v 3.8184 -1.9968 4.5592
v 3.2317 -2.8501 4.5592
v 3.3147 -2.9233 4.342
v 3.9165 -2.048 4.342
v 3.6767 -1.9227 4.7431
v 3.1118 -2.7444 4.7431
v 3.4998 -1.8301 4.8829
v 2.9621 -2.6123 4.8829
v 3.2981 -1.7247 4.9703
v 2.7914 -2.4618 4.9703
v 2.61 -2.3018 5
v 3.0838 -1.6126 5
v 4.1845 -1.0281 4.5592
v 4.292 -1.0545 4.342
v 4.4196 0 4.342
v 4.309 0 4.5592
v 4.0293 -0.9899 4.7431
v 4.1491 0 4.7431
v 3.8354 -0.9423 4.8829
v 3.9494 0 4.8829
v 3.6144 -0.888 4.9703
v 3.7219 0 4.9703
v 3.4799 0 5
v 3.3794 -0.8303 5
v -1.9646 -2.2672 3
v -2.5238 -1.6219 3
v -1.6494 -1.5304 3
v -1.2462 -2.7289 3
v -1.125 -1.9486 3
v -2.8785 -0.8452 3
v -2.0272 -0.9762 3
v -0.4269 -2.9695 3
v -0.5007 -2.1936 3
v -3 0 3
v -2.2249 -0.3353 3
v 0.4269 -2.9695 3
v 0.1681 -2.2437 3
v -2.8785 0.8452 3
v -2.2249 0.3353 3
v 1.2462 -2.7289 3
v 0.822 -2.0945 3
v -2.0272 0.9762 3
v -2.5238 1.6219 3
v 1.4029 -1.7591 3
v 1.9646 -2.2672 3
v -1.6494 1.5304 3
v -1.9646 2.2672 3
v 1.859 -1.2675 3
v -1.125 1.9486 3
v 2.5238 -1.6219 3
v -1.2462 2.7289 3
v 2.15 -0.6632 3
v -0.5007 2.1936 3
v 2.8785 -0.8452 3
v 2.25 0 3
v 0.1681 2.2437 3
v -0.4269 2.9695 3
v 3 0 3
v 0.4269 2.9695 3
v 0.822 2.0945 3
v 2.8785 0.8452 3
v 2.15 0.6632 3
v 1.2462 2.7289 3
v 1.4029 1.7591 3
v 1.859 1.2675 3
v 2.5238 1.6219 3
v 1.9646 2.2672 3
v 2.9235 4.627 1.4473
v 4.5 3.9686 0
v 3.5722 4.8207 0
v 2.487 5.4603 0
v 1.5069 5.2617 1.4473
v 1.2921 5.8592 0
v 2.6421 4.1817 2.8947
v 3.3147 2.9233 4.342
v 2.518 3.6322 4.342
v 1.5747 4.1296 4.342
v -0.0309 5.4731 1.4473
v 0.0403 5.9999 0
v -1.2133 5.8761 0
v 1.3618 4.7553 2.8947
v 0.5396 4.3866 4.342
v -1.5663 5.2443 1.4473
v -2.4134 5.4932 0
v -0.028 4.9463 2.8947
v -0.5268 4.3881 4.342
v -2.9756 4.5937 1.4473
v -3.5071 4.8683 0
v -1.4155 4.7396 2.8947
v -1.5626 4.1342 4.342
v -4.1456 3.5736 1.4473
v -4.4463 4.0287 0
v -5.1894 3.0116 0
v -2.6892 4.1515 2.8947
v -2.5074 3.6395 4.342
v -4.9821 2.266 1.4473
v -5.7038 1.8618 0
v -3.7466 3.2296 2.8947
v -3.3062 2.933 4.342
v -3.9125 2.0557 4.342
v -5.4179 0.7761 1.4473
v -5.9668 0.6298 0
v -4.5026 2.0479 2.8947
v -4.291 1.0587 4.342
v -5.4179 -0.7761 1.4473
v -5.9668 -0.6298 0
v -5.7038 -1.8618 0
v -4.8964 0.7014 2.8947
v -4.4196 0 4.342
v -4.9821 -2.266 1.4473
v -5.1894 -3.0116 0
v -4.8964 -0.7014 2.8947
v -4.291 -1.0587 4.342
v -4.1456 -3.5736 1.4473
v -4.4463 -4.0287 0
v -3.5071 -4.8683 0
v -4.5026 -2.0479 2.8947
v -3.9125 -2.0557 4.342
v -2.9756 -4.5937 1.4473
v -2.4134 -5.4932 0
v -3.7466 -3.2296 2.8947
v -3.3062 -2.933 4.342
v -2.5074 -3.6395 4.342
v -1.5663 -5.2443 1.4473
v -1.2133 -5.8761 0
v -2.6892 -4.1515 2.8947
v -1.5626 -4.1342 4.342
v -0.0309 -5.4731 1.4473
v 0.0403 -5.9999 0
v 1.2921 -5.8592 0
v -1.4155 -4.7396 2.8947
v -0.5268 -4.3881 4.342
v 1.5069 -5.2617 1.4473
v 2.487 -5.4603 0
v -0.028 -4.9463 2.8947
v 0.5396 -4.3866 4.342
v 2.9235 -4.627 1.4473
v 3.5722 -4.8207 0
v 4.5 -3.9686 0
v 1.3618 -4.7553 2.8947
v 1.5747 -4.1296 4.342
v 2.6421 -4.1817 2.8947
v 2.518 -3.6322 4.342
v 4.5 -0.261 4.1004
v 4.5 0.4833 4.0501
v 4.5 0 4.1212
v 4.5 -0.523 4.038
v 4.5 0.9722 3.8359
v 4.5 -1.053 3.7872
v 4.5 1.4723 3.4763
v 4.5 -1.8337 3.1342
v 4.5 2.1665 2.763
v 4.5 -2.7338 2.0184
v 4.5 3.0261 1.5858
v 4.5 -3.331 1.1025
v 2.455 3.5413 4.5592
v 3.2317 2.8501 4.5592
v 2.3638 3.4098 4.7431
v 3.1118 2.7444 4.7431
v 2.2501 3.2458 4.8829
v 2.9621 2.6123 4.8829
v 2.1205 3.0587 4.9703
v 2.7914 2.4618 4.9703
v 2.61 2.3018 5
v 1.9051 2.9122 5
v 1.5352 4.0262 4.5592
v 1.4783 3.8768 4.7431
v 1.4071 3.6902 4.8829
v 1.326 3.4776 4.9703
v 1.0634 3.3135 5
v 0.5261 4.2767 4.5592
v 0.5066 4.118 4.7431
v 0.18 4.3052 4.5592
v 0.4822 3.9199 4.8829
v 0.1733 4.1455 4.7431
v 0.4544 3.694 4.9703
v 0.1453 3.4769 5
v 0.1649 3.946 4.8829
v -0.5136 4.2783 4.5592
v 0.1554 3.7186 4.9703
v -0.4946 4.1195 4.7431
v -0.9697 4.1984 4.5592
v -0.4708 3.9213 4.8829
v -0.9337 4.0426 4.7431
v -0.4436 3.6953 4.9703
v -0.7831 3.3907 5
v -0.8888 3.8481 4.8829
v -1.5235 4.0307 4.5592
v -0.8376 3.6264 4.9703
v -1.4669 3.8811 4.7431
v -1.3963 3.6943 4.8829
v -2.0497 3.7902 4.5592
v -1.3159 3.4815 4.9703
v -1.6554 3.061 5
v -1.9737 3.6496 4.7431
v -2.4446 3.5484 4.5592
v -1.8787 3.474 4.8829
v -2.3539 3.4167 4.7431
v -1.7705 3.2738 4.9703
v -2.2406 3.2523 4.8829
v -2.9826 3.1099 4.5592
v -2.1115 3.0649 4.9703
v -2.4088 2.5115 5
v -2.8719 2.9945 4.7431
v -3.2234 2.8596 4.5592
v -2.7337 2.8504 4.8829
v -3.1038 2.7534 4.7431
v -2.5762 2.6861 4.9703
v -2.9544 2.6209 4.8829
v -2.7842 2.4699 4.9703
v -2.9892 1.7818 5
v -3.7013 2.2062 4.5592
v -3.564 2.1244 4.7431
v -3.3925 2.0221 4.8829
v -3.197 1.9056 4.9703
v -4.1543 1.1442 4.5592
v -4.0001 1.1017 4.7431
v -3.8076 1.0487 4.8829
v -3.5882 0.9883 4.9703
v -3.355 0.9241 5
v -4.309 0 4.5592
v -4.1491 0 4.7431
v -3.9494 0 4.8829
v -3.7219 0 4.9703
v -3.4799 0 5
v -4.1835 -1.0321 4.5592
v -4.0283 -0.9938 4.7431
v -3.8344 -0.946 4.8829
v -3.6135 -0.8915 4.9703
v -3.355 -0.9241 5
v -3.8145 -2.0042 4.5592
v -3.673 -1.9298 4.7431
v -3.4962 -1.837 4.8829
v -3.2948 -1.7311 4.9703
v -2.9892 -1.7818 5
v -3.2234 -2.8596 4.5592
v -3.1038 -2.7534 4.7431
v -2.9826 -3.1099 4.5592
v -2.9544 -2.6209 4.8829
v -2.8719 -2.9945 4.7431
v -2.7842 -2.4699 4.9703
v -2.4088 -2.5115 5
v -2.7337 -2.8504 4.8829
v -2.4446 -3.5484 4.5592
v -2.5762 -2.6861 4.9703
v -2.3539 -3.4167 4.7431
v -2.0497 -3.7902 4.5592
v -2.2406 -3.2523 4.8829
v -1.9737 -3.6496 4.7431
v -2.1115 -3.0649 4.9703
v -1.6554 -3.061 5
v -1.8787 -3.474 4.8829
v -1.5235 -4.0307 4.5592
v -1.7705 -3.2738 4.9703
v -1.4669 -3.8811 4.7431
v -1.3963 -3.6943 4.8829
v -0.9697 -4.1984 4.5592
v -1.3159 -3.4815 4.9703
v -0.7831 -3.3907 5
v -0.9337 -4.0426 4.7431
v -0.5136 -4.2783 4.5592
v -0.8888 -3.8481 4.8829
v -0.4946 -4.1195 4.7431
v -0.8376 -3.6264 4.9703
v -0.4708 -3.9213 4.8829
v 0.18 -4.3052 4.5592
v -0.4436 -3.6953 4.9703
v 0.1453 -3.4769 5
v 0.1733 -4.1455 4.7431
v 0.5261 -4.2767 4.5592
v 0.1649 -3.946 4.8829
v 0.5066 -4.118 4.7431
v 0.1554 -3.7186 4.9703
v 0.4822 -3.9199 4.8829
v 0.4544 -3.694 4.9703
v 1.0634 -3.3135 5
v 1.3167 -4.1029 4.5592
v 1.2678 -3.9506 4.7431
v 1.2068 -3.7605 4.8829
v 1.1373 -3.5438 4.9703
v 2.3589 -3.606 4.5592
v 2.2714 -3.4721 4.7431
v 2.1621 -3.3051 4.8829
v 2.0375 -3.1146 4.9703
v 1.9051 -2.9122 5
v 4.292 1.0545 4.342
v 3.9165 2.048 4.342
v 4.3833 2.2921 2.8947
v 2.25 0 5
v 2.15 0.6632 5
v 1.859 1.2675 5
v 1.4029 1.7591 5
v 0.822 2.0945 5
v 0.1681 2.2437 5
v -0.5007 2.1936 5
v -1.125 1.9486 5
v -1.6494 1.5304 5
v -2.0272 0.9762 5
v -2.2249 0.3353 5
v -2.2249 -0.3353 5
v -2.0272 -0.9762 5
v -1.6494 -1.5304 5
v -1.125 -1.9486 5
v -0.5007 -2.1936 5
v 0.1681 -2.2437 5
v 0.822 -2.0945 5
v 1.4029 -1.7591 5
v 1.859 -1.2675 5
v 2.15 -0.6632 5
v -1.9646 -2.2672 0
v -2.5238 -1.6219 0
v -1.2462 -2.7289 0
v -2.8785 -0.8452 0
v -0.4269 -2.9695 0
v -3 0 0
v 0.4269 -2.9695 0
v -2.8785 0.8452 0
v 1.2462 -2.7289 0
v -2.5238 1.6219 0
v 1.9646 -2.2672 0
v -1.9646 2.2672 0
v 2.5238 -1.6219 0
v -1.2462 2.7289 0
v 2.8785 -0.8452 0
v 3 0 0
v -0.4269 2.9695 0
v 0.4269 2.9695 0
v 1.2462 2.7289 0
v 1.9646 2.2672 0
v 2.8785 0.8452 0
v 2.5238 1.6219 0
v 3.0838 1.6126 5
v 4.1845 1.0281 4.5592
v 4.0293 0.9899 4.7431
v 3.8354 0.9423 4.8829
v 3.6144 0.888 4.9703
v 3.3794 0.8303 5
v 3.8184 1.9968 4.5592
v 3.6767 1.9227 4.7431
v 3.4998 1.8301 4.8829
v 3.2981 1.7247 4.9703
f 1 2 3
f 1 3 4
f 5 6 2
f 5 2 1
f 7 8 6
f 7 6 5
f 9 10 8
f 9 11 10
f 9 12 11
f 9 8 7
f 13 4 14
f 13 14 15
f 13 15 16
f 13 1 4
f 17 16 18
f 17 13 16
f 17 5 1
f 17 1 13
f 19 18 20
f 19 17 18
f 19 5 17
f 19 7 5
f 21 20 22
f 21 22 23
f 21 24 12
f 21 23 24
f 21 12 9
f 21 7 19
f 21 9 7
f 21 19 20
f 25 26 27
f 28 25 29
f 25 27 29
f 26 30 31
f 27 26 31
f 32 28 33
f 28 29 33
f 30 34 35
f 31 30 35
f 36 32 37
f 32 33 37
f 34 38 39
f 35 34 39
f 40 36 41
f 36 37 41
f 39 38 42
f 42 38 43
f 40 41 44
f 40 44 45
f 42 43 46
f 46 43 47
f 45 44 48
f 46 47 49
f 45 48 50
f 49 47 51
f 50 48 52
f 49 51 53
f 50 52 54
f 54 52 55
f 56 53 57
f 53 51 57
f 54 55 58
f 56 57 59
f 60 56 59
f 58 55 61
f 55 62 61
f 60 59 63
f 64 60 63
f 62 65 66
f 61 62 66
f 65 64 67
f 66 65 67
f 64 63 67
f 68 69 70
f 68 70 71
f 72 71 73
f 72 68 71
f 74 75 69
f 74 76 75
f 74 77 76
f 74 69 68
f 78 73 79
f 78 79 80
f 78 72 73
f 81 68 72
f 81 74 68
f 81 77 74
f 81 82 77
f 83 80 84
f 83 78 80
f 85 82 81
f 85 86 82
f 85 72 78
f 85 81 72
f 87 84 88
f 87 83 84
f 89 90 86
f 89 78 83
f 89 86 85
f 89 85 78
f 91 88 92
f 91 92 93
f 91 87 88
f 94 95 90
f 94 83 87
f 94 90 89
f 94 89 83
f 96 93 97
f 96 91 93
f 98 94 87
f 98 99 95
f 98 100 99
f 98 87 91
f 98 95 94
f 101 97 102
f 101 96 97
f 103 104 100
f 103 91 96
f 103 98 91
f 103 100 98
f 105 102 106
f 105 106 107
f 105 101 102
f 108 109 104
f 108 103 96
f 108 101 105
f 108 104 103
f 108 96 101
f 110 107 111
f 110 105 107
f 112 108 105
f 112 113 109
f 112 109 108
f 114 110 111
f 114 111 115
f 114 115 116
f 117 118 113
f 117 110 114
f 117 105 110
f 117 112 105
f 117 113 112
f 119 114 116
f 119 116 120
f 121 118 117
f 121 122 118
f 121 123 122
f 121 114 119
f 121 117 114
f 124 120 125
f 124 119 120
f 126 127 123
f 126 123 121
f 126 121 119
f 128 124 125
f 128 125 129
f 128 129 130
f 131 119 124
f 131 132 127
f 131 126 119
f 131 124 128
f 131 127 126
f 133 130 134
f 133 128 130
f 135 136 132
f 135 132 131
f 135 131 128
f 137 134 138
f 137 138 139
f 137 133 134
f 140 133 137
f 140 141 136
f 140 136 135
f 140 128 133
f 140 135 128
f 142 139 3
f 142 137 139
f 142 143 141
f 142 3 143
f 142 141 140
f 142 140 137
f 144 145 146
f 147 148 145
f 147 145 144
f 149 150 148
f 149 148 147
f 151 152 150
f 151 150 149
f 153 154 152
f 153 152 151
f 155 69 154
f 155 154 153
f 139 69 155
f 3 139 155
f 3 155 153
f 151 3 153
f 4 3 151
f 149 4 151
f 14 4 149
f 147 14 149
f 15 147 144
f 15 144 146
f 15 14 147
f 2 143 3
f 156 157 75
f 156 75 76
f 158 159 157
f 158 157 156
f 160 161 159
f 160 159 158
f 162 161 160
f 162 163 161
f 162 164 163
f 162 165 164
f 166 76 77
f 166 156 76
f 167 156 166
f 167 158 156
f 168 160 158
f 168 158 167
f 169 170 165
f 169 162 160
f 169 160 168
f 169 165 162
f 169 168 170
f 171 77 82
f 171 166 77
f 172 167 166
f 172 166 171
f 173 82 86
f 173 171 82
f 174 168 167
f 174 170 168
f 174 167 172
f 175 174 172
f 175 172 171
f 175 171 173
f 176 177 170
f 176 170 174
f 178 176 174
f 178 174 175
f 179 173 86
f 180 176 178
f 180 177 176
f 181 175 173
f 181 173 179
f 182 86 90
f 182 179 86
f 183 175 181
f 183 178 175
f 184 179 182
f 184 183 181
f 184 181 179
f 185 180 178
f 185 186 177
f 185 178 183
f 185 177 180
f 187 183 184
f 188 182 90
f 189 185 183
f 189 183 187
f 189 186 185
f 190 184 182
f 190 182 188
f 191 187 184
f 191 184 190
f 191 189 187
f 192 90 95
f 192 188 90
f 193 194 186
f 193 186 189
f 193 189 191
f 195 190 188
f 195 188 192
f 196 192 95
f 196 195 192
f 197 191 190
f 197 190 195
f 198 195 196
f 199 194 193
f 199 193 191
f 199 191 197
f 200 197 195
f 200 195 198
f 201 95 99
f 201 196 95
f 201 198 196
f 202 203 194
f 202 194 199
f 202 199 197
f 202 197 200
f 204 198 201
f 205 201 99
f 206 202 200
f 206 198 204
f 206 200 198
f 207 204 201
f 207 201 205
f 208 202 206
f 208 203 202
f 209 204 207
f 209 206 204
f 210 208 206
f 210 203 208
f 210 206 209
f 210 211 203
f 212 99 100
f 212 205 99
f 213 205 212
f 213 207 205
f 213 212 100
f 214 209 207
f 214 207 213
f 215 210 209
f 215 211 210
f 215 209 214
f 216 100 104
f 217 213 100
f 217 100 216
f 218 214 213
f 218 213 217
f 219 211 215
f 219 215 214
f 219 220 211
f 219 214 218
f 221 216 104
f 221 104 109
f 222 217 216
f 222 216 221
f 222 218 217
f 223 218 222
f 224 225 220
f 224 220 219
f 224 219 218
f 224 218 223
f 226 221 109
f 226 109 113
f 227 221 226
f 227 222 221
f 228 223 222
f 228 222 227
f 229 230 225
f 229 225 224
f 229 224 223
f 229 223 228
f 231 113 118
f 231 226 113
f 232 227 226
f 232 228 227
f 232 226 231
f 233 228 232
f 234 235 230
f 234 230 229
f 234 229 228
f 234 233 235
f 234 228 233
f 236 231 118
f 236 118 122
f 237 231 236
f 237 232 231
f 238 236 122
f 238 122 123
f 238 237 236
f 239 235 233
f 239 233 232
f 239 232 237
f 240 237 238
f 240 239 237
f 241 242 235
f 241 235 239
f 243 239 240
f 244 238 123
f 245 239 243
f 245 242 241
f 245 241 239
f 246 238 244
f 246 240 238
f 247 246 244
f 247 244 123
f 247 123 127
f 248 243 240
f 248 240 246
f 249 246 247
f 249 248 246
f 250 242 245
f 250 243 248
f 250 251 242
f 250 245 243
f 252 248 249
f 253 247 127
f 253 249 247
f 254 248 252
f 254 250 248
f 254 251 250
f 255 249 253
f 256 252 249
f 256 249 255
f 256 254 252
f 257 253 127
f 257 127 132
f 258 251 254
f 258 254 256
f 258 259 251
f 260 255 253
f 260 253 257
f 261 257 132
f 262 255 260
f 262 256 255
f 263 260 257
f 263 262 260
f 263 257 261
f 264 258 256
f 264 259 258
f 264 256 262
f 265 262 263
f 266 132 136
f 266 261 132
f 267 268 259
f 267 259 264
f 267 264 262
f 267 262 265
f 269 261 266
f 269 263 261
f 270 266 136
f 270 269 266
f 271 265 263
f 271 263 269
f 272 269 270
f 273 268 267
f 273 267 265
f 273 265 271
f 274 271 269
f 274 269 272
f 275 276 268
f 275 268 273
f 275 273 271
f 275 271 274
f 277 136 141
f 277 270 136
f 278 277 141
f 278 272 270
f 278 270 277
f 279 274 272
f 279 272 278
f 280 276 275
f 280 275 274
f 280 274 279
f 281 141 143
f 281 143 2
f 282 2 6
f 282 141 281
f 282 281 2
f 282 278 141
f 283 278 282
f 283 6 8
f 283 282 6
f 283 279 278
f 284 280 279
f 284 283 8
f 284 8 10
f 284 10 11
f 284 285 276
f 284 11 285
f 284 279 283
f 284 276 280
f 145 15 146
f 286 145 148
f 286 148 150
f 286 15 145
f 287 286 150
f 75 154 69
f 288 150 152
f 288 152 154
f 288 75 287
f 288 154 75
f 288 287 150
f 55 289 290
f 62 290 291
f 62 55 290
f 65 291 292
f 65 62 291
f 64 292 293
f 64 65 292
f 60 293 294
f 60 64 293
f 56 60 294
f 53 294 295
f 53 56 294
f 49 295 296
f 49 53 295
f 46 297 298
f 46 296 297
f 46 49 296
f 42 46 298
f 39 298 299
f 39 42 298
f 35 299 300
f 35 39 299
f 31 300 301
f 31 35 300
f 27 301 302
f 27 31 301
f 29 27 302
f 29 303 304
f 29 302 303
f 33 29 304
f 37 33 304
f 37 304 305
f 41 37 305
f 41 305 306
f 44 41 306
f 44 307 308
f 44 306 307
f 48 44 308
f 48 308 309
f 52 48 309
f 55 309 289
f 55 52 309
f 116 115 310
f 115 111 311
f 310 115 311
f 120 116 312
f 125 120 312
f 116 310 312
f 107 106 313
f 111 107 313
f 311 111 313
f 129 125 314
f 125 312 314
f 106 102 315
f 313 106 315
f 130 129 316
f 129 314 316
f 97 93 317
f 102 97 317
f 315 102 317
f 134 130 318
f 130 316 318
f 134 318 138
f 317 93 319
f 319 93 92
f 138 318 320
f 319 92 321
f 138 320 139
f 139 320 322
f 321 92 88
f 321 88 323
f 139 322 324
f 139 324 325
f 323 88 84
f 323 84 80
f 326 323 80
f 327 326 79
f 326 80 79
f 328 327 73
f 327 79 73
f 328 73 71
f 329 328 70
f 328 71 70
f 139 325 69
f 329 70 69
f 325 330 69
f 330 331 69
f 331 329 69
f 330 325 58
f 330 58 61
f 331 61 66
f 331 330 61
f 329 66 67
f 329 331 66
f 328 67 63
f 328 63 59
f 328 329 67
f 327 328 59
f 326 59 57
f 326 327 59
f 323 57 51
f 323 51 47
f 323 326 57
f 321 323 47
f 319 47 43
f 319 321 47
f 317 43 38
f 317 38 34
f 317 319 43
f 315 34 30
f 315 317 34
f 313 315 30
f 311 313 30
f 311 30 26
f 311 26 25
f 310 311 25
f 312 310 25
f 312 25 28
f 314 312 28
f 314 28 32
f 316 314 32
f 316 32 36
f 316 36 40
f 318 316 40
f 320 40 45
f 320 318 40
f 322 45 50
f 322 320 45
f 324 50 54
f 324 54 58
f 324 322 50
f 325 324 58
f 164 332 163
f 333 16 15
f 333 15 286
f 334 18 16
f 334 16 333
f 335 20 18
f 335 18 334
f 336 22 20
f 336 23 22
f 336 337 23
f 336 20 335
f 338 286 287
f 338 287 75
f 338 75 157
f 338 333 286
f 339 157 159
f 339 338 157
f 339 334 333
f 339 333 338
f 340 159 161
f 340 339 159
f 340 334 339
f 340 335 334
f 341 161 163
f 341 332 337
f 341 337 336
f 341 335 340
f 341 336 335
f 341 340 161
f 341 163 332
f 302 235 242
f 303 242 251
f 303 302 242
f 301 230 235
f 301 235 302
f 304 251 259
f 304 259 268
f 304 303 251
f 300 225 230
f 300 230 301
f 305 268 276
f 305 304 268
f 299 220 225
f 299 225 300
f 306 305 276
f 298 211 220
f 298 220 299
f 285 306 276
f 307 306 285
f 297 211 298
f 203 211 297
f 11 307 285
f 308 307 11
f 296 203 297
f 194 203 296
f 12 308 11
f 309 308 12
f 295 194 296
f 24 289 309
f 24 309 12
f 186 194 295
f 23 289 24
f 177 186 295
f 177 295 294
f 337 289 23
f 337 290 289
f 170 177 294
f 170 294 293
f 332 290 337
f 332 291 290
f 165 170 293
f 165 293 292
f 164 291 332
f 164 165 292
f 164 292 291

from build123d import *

# Parameters (mm, degrees)
F0_R     = 3
F0_R_2   = 2.25
F1_DEPTH = 5
F1_TAPER = 20
F2_DEPTH = 3
F3_DEPTH = 25
F4_R     = 1
F5_DEPTH = 25


with BuildPart() as f1:
    # F0 (on Top) → F1 (new body)
    with BuildSketch(Plane.XY):
        with BuildLine():
            Line((4.5, -3.9686269666), (4.5, 3.9686269666))
            ThreePointArc((4.5, 3.9686269666), (-6, 0), (4.5, -3.9686269666))
        make_face()
        Circle(F0_R, mode=Mode.SUBTRACT)
        Circle(F0_R)
        Circle(F0_R_2, mode=Mode.SUBTRACT)
        Circle(F0_R_2)
        with BuildLine():
            ThreePointArc((4.5, -3.9686269666), (5.6124860802, -2.1213203436), (6, 0))
            ThreePointArc((6, 0), (5.6124860802, 2.1213203436), (4.5, 3.9686269666))
            Line((4.5, 3.9686269666), (4.5, -3.9686269666))
        make_face()
    extrude(amount=F1_DEPTH, taper=F1_TAPER)

    # F0 (on Top) → F2 (cut)
    with BuildSketch(Plane.XY):
        Circle(F0_R)
        Circle(F0_R_2, mode=Mode.SUBTRACT)
    extrude(amount=F2_DEPTH, mode=Mode.SUBTRACT)

    # F0 (on Top) → F3 (cut)
    with BuildSketch(Plane.XY):
        Circle(F0_R_2)
    extrude(amount=F3_DEPTH, mode=Mode.SUBTRACT)

    # F4
    f4_edges = [f1.edges().sort_by_distance(p)[0] for p in [
        (-3.135112, 2.764909, 5),
    ]]
    fillet(f4_edges, radius=F4_R)

    # F0 (on Top) → F5 (cut)
    with BuildSketch(Plane.XY):
        with BuildLine():
            ThreePointArc((4.5, -3.9686269666), (5.6124860802, -2.1213203436), (6, 0))
            ThreePointArc((6, 0), (5.6124860802, 2.1213203436), (4.5, 3.9686269666))
            Line((4.5, 3.9686269666), (4.5, -3.9686269666))
        make_face()
    extrude(amount=F5_DEPTH, mode=Mode.SUBTRACT)


solid = f1.part
